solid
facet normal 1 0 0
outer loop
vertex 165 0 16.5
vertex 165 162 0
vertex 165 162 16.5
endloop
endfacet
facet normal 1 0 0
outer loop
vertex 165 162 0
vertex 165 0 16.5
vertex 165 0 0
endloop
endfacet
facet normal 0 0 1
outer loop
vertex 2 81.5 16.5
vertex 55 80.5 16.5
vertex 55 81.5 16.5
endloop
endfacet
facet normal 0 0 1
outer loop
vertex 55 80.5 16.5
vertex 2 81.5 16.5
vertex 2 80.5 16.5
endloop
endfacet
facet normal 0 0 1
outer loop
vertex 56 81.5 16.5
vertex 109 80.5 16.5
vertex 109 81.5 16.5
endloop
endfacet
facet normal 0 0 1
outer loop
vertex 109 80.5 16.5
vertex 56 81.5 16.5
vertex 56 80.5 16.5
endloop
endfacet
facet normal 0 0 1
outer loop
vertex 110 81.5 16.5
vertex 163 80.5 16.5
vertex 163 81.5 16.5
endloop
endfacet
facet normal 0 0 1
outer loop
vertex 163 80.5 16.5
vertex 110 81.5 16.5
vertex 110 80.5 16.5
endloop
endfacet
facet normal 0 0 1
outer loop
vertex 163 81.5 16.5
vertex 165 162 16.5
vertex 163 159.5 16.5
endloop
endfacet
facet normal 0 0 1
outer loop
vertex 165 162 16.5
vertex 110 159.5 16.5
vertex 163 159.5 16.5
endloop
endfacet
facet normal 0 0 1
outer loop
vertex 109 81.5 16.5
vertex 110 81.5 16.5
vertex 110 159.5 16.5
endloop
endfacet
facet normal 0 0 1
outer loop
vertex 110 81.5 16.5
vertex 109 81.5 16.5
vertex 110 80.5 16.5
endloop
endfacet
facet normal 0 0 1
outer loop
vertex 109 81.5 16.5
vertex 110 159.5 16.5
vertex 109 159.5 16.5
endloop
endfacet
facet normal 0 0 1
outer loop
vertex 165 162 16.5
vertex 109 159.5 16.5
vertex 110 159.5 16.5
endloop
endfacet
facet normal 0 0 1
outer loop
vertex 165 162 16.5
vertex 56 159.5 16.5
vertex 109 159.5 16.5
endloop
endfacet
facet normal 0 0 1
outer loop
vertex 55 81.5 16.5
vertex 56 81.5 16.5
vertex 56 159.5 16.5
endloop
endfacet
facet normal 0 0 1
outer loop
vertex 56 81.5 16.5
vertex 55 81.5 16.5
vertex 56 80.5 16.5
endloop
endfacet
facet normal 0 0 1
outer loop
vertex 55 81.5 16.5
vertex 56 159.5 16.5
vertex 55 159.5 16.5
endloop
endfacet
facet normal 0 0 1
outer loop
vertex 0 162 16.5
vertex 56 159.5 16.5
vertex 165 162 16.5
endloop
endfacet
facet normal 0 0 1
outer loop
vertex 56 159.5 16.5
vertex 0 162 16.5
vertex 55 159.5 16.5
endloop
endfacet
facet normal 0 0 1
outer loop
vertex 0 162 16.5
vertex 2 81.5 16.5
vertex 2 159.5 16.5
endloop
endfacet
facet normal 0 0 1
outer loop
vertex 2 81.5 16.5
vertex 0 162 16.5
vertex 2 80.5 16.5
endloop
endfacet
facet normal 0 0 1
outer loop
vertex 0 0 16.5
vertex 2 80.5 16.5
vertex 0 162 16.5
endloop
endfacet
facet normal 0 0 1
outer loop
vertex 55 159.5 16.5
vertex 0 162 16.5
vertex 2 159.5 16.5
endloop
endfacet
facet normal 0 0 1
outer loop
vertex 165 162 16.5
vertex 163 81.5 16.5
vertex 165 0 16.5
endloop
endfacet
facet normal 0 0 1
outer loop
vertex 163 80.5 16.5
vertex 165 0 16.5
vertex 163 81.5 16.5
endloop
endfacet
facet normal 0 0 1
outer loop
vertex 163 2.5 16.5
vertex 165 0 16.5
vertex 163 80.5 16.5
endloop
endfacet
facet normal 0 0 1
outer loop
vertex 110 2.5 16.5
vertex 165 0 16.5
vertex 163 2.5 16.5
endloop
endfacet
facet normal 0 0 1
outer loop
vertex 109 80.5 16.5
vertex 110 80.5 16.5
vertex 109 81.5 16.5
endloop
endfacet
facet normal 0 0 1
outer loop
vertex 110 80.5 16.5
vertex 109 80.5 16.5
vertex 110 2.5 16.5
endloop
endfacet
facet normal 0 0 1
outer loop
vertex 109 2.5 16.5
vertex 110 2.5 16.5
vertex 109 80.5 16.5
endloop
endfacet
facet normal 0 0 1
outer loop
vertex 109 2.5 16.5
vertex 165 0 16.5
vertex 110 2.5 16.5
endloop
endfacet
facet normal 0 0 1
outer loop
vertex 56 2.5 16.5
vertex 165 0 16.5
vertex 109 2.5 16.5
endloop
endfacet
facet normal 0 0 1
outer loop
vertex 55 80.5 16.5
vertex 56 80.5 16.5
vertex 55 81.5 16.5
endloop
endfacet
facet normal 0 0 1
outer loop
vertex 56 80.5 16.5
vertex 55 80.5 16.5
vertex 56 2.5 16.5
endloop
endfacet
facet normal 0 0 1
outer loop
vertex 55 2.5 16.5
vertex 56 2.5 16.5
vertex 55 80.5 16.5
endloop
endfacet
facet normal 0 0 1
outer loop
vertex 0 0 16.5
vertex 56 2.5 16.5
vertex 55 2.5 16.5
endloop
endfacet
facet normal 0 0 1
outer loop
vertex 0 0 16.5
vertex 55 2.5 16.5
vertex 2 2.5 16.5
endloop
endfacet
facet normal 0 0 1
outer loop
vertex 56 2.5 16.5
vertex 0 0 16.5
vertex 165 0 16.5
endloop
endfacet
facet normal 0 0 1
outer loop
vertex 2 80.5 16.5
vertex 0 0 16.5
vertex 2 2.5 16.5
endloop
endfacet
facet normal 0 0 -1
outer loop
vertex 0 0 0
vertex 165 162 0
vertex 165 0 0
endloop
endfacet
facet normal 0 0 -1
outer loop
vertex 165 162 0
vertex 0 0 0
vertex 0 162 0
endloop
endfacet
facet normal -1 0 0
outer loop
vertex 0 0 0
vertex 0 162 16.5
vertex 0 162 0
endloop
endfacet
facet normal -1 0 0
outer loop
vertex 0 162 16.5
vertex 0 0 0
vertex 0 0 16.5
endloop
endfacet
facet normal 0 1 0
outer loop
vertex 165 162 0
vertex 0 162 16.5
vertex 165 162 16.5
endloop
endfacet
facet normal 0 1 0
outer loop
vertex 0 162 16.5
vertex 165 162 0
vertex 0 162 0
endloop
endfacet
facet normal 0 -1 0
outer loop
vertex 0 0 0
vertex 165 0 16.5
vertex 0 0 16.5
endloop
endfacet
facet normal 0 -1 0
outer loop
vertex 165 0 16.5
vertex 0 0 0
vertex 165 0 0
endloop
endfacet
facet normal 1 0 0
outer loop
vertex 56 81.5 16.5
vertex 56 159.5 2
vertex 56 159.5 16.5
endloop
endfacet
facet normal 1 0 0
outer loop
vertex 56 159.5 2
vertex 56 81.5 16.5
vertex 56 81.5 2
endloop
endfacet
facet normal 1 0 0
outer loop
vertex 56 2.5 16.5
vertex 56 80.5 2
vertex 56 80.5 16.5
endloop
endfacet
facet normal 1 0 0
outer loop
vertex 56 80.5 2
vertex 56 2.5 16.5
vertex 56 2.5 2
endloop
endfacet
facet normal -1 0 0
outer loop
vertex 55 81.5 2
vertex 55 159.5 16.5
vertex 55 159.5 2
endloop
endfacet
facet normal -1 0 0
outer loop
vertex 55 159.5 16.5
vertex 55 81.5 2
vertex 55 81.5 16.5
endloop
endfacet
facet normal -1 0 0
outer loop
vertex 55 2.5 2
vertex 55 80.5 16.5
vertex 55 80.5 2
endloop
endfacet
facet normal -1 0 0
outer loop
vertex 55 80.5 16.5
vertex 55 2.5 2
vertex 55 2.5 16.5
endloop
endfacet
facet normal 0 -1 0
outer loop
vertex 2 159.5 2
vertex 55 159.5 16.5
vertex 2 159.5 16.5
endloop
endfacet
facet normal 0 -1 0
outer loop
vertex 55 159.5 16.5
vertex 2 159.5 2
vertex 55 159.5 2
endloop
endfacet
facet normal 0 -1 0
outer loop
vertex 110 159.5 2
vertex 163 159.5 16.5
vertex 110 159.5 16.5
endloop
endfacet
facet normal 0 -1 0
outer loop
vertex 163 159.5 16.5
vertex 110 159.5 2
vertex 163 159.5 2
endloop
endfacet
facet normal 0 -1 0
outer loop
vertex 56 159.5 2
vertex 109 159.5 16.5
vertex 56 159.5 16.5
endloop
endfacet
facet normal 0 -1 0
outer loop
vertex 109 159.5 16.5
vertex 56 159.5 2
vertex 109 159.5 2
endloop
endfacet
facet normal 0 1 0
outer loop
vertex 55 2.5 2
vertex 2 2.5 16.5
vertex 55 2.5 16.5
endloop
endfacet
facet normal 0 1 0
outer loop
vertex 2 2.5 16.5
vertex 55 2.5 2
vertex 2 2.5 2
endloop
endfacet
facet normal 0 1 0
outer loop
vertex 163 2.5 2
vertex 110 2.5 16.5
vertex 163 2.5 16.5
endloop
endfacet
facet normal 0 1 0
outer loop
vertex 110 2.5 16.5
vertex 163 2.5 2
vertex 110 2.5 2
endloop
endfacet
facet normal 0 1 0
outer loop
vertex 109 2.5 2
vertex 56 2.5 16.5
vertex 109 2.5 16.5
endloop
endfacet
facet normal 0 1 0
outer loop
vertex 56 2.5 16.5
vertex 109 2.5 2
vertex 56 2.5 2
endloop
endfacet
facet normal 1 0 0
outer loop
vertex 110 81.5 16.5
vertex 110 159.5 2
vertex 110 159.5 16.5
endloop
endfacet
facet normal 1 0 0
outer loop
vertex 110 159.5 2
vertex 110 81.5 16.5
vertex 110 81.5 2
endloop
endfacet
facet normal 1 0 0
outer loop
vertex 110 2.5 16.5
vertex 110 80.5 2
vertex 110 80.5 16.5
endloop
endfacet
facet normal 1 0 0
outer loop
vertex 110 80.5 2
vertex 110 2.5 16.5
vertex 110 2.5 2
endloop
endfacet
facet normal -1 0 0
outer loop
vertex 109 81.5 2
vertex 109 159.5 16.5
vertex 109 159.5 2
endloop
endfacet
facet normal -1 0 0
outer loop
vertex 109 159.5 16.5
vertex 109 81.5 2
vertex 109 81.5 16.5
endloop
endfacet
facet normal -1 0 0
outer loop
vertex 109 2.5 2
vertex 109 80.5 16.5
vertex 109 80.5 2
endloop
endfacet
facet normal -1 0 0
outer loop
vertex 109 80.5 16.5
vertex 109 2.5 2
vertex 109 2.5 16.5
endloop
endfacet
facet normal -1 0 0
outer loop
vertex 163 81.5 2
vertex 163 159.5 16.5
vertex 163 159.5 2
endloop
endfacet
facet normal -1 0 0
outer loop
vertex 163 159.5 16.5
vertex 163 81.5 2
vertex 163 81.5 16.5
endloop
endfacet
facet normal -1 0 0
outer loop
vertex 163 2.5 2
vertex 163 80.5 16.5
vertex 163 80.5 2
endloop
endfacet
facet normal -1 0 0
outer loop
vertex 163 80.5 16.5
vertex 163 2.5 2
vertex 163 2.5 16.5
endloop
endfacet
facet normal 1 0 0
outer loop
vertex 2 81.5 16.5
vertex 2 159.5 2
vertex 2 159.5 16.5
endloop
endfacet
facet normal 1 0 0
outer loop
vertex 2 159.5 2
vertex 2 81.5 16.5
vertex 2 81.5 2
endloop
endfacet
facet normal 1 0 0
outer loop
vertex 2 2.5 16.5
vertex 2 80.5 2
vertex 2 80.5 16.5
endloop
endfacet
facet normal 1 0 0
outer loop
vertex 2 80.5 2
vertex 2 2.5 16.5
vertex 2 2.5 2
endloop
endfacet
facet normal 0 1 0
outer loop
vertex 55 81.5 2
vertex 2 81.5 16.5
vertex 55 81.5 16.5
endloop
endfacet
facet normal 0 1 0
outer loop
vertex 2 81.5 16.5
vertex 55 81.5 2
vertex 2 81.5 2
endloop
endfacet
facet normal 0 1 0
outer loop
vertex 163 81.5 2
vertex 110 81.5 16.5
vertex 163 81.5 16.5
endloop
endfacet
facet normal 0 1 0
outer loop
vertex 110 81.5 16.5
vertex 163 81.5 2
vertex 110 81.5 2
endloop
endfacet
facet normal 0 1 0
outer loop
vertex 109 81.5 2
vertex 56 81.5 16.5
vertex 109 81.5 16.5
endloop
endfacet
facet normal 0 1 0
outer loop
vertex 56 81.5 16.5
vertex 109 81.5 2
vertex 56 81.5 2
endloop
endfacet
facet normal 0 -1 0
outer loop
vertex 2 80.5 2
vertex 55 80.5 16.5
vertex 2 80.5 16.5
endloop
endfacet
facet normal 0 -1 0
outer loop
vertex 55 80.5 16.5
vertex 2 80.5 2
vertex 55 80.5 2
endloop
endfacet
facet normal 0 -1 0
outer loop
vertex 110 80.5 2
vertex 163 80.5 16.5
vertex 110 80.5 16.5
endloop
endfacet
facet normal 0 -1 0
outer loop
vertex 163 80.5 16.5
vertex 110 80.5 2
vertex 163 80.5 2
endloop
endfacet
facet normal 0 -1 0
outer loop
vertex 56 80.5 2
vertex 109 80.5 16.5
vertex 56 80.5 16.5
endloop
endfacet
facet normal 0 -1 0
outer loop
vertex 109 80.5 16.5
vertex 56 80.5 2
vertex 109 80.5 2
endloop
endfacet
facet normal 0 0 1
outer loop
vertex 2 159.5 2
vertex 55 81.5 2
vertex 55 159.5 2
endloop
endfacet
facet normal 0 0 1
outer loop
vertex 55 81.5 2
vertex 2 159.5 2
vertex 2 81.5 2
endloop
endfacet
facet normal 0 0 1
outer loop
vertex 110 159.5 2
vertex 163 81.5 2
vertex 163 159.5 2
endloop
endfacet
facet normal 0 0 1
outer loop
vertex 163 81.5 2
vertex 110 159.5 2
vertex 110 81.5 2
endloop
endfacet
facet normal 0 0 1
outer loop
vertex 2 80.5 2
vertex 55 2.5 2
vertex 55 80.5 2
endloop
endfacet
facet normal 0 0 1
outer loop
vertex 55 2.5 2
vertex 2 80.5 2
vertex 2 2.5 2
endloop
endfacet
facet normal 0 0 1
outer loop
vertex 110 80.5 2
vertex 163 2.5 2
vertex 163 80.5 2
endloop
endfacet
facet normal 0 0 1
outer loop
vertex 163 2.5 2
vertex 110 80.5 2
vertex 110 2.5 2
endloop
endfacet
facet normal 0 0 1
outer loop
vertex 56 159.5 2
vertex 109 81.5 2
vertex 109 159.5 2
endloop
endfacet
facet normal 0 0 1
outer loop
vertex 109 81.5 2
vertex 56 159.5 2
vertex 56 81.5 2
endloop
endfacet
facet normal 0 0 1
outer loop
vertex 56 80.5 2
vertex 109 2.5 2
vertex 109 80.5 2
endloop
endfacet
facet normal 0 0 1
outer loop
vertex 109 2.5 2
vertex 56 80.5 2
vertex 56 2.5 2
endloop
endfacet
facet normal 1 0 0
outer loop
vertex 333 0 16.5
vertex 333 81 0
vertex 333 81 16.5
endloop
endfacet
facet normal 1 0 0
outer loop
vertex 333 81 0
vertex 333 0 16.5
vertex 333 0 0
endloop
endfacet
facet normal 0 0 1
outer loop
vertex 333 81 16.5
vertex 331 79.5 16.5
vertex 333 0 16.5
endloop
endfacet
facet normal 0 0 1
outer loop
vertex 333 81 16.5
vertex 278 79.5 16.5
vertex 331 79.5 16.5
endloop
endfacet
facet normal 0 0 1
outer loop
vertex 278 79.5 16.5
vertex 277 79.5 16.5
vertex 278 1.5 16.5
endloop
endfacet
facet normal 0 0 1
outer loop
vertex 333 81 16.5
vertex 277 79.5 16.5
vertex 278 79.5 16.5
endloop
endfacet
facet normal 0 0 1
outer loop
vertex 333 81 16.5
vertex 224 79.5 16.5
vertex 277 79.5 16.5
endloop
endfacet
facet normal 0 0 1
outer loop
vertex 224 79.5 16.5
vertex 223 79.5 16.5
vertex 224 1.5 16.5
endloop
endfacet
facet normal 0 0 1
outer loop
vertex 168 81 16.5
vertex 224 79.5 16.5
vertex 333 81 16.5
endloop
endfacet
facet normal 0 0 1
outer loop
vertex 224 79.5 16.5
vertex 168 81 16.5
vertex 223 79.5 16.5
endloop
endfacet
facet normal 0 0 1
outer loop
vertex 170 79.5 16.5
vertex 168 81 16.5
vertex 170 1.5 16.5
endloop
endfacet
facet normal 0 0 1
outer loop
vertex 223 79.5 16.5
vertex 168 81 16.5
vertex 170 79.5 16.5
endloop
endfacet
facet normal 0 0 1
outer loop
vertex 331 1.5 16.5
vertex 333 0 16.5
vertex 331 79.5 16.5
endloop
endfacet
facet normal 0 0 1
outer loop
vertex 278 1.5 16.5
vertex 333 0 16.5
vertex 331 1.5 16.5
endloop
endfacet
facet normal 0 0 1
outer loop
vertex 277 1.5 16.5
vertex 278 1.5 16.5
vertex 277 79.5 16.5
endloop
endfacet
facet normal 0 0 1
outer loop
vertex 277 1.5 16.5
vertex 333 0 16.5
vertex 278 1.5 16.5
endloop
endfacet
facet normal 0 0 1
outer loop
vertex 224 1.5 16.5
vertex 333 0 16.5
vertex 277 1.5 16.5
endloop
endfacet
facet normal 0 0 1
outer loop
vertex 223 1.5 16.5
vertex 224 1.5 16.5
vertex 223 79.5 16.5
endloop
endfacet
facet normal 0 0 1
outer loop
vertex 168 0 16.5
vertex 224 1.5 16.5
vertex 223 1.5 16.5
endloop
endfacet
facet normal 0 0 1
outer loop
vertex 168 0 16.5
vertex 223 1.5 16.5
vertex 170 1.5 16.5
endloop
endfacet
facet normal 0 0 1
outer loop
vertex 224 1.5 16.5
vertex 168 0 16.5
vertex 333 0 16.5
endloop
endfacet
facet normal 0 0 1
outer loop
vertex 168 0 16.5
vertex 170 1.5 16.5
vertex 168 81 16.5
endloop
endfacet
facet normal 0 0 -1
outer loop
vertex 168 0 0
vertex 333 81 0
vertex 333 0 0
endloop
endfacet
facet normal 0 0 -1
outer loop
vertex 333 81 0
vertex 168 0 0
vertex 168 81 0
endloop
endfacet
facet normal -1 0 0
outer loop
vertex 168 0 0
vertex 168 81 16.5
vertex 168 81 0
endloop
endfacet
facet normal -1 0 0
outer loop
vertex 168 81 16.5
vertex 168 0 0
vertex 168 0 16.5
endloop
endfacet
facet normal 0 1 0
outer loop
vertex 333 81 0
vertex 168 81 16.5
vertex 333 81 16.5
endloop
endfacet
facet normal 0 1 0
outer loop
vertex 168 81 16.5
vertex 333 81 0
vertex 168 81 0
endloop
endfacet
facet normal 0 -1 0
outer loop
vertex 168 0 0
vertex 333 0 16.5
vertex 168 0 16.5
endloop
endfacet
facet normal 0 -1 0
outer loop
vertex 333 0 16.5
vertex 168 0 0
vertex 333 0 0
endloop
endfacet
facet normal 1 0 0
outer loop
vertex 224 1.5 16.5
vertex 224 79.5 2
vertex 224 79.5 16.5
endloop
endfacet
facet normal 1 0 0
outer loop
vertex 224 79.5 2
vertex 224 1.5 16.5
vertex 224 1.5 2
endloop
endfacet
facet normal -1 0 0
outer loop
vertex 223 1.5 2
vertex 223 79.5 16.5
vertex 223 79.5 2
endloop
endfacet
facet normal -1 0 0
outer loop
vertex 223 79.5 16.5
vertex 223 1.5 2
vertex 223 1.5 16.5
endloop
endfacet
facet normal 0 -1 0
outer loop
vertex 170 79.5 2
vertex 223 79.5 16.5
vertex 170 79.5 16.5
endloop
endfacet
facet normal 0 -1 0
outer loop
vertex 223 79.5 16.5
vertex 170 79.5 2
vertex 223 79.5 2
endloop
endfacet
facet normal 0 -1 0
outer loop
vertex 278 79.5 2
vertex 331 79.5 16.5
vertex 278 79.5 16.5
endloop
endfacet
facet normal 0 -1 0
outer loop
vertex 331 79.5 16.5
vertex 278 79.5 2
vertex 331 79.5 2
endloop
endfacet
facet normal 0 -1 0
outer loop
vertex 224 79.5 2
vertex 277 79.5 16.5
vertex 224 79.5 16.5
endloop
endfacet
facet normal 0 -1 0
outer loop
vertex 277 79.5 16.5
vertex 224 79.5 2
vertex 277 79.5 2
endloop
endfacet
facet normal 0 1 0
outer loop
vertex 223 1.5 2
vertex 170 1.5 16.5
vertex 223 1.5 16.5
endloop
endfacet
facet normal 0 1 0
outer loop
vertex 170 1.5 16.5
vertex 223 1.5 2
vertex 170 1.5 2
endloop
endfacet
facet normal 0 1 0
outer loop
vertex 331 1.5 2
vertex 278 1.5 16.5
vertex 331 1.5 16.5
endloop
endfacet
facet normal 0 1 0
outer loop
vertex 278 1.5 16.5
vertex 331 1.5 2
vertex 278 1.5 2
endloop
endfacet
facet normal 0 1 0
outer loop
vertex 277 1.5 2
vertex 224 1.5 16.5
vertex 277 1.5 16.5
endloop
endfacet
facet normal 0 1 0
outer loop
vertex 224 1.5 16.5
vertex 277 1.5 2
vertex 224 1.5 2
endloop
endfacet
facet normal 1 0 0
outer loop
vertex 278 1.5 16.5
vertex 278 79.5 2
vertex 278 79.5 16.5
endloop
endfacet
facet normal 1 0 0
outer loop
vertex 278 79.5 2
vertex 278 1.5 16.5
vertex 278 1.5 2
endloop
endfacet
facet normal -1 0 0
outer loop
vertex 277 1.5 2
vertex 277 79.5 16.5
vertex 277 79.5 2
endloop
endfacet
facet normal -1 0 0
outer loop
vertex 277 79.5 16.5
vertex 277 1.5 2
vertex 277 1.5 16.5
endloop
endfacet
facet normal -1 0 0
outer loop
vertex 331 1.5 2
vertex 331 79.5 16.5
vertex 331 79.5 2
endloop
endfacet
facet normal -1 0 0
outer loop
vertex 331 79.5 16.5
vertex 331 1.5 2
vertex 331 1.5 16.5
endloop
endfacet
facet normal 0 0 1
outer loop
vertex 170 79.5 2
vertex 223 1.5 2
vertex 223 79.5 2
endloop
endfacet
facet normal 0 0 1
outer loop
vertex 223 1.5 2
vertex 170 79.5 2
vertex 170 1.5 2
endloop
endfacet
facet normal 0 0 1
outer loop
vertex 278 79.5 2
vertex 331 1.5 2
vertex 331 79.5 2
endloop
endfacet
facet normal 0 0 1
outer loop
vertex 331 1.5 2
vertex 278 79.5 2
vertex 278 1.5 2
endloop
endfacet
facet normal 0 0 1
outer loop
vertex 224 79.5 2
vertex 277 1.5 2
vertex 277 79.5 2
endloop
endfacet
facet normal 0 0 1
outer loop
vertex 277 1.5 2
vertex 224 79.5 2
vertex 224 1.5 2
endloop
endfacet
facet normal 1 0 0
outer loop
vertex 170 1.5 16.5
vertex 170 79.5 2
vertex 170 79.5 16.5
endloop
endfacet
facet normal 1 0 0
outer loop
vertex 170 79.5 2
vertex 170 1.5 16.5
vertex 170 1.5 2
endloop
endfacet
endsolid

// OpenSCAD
include <lib/boardgame_insert_toolkit_lib.2.scad>;

// determines whether lids are output.
g_b_print_lid = true;

// determines whether boxes are output.
g_b_print_box = true; 

// Focus on one box
g_isolated_print_box = ""; 

// Used to visualize how all of the boxes fit together. 
g_b_visualization = false;          
        
// this is the outer wall thickness. 
//Default = 1.5mm
g_wall_thickness = 1.5;

// The tolerance value is extra space put between planes of the lid and box that fit together.
// Increase the tolerance to loosen the fit and decrease it to tighten it.
//
// Note that the tolerance is applied exclusively to the lid.
// So if the lid is too tight or too loose, change this value ( up for looser fit, down for tighter fit ) and 
// you only need to reprint the lid.
// 
// The exception is the stackable box, where the bottom of the box is the lid of the box below,
// in which case the tolerance also affects that box bottom.
//
g_tolerance = 0.15;

// This adjusts the position of the lid detents downward. 
// The larger the value, the bigger the gap between the lid and the box.
g_tolerance_detents_pos = 0.1;

// This determines whether the default single material version is output, or, if printing in multiple materials, 
// which layer to output.
//
g_print_mmu_layer = "default"; // [ "default" | "mmu_box_layer" | "mmu_label_layer" ]

data =
[


    [   "Resources",
        [
            [ BOX_SIZE_XYZ,[165, 162, 16.5] ],
            [ BOX_NO_LID_B,
                [
                    [ ],
                ]
            ],
            [ BOX_COMPONENT,
                [
                    [ CMP_SHAPE, SQUARE ],
                    [ CMP_NUM_COMPARTMENTS_XY, [3, 2] ],
                    [ CMP_COMPARTMENT_SIZE_XYZ, [ 53, 78, 14.5] ],
                    [ CMP_CUTOUT_SIDES_4B, [f,f,f,f]],
                    [ CMP_CUTOUT_HEIGHT_PCT, 50 ],
                    [ CMP_CUTOUT_WIDTH_PCT, 60 ],
                    [ CMP_CUTOUT_TYPE, BOTH ],
                    [ CMP_CUTOUT_BOTTOM_B, f ],
                    [ CMP_CUTOUT_BOTTOM_PCT, 50 ],
                ]
            ],

        ]
    ],

    [   "GameSetupComponents",
        [
            [ BOX_SIZE_XYZ,[165, 81, 16.5] ],
            [ BOX_NO_LID_B,
                [
                    [ ],
                ]
            ],
            [ BOX_COMPONENT,
                [
                    [ CMP_SHAPE, SQUARE ],
                    [ CMP_NUM_COMPARTMENTS_XY, [3, 1] ],
                    [ CMP_COMPARTMENT_SIZE_XYZ, [ 53, 78, 14.5] ],
                    [ CMP_CUTOUT_SIDES_4B, [f,f,f,f]],
                    [ CMP_CUTOUT_HEIGHT_PCT, 50 ],
                    [ CMP_CUTOUT_WIDTH_PCT, 60 ],
                    [ CMP_CUTOUT_TYPE, BOTH ],
                    [ CMP_CUTOUT_BOTTOM_B, f ],
                    [ CMP_CUTOUT_BOTTOM_PCT, 50 ],
                ]
            ],

        ]
    ],
];


MakeAll();
